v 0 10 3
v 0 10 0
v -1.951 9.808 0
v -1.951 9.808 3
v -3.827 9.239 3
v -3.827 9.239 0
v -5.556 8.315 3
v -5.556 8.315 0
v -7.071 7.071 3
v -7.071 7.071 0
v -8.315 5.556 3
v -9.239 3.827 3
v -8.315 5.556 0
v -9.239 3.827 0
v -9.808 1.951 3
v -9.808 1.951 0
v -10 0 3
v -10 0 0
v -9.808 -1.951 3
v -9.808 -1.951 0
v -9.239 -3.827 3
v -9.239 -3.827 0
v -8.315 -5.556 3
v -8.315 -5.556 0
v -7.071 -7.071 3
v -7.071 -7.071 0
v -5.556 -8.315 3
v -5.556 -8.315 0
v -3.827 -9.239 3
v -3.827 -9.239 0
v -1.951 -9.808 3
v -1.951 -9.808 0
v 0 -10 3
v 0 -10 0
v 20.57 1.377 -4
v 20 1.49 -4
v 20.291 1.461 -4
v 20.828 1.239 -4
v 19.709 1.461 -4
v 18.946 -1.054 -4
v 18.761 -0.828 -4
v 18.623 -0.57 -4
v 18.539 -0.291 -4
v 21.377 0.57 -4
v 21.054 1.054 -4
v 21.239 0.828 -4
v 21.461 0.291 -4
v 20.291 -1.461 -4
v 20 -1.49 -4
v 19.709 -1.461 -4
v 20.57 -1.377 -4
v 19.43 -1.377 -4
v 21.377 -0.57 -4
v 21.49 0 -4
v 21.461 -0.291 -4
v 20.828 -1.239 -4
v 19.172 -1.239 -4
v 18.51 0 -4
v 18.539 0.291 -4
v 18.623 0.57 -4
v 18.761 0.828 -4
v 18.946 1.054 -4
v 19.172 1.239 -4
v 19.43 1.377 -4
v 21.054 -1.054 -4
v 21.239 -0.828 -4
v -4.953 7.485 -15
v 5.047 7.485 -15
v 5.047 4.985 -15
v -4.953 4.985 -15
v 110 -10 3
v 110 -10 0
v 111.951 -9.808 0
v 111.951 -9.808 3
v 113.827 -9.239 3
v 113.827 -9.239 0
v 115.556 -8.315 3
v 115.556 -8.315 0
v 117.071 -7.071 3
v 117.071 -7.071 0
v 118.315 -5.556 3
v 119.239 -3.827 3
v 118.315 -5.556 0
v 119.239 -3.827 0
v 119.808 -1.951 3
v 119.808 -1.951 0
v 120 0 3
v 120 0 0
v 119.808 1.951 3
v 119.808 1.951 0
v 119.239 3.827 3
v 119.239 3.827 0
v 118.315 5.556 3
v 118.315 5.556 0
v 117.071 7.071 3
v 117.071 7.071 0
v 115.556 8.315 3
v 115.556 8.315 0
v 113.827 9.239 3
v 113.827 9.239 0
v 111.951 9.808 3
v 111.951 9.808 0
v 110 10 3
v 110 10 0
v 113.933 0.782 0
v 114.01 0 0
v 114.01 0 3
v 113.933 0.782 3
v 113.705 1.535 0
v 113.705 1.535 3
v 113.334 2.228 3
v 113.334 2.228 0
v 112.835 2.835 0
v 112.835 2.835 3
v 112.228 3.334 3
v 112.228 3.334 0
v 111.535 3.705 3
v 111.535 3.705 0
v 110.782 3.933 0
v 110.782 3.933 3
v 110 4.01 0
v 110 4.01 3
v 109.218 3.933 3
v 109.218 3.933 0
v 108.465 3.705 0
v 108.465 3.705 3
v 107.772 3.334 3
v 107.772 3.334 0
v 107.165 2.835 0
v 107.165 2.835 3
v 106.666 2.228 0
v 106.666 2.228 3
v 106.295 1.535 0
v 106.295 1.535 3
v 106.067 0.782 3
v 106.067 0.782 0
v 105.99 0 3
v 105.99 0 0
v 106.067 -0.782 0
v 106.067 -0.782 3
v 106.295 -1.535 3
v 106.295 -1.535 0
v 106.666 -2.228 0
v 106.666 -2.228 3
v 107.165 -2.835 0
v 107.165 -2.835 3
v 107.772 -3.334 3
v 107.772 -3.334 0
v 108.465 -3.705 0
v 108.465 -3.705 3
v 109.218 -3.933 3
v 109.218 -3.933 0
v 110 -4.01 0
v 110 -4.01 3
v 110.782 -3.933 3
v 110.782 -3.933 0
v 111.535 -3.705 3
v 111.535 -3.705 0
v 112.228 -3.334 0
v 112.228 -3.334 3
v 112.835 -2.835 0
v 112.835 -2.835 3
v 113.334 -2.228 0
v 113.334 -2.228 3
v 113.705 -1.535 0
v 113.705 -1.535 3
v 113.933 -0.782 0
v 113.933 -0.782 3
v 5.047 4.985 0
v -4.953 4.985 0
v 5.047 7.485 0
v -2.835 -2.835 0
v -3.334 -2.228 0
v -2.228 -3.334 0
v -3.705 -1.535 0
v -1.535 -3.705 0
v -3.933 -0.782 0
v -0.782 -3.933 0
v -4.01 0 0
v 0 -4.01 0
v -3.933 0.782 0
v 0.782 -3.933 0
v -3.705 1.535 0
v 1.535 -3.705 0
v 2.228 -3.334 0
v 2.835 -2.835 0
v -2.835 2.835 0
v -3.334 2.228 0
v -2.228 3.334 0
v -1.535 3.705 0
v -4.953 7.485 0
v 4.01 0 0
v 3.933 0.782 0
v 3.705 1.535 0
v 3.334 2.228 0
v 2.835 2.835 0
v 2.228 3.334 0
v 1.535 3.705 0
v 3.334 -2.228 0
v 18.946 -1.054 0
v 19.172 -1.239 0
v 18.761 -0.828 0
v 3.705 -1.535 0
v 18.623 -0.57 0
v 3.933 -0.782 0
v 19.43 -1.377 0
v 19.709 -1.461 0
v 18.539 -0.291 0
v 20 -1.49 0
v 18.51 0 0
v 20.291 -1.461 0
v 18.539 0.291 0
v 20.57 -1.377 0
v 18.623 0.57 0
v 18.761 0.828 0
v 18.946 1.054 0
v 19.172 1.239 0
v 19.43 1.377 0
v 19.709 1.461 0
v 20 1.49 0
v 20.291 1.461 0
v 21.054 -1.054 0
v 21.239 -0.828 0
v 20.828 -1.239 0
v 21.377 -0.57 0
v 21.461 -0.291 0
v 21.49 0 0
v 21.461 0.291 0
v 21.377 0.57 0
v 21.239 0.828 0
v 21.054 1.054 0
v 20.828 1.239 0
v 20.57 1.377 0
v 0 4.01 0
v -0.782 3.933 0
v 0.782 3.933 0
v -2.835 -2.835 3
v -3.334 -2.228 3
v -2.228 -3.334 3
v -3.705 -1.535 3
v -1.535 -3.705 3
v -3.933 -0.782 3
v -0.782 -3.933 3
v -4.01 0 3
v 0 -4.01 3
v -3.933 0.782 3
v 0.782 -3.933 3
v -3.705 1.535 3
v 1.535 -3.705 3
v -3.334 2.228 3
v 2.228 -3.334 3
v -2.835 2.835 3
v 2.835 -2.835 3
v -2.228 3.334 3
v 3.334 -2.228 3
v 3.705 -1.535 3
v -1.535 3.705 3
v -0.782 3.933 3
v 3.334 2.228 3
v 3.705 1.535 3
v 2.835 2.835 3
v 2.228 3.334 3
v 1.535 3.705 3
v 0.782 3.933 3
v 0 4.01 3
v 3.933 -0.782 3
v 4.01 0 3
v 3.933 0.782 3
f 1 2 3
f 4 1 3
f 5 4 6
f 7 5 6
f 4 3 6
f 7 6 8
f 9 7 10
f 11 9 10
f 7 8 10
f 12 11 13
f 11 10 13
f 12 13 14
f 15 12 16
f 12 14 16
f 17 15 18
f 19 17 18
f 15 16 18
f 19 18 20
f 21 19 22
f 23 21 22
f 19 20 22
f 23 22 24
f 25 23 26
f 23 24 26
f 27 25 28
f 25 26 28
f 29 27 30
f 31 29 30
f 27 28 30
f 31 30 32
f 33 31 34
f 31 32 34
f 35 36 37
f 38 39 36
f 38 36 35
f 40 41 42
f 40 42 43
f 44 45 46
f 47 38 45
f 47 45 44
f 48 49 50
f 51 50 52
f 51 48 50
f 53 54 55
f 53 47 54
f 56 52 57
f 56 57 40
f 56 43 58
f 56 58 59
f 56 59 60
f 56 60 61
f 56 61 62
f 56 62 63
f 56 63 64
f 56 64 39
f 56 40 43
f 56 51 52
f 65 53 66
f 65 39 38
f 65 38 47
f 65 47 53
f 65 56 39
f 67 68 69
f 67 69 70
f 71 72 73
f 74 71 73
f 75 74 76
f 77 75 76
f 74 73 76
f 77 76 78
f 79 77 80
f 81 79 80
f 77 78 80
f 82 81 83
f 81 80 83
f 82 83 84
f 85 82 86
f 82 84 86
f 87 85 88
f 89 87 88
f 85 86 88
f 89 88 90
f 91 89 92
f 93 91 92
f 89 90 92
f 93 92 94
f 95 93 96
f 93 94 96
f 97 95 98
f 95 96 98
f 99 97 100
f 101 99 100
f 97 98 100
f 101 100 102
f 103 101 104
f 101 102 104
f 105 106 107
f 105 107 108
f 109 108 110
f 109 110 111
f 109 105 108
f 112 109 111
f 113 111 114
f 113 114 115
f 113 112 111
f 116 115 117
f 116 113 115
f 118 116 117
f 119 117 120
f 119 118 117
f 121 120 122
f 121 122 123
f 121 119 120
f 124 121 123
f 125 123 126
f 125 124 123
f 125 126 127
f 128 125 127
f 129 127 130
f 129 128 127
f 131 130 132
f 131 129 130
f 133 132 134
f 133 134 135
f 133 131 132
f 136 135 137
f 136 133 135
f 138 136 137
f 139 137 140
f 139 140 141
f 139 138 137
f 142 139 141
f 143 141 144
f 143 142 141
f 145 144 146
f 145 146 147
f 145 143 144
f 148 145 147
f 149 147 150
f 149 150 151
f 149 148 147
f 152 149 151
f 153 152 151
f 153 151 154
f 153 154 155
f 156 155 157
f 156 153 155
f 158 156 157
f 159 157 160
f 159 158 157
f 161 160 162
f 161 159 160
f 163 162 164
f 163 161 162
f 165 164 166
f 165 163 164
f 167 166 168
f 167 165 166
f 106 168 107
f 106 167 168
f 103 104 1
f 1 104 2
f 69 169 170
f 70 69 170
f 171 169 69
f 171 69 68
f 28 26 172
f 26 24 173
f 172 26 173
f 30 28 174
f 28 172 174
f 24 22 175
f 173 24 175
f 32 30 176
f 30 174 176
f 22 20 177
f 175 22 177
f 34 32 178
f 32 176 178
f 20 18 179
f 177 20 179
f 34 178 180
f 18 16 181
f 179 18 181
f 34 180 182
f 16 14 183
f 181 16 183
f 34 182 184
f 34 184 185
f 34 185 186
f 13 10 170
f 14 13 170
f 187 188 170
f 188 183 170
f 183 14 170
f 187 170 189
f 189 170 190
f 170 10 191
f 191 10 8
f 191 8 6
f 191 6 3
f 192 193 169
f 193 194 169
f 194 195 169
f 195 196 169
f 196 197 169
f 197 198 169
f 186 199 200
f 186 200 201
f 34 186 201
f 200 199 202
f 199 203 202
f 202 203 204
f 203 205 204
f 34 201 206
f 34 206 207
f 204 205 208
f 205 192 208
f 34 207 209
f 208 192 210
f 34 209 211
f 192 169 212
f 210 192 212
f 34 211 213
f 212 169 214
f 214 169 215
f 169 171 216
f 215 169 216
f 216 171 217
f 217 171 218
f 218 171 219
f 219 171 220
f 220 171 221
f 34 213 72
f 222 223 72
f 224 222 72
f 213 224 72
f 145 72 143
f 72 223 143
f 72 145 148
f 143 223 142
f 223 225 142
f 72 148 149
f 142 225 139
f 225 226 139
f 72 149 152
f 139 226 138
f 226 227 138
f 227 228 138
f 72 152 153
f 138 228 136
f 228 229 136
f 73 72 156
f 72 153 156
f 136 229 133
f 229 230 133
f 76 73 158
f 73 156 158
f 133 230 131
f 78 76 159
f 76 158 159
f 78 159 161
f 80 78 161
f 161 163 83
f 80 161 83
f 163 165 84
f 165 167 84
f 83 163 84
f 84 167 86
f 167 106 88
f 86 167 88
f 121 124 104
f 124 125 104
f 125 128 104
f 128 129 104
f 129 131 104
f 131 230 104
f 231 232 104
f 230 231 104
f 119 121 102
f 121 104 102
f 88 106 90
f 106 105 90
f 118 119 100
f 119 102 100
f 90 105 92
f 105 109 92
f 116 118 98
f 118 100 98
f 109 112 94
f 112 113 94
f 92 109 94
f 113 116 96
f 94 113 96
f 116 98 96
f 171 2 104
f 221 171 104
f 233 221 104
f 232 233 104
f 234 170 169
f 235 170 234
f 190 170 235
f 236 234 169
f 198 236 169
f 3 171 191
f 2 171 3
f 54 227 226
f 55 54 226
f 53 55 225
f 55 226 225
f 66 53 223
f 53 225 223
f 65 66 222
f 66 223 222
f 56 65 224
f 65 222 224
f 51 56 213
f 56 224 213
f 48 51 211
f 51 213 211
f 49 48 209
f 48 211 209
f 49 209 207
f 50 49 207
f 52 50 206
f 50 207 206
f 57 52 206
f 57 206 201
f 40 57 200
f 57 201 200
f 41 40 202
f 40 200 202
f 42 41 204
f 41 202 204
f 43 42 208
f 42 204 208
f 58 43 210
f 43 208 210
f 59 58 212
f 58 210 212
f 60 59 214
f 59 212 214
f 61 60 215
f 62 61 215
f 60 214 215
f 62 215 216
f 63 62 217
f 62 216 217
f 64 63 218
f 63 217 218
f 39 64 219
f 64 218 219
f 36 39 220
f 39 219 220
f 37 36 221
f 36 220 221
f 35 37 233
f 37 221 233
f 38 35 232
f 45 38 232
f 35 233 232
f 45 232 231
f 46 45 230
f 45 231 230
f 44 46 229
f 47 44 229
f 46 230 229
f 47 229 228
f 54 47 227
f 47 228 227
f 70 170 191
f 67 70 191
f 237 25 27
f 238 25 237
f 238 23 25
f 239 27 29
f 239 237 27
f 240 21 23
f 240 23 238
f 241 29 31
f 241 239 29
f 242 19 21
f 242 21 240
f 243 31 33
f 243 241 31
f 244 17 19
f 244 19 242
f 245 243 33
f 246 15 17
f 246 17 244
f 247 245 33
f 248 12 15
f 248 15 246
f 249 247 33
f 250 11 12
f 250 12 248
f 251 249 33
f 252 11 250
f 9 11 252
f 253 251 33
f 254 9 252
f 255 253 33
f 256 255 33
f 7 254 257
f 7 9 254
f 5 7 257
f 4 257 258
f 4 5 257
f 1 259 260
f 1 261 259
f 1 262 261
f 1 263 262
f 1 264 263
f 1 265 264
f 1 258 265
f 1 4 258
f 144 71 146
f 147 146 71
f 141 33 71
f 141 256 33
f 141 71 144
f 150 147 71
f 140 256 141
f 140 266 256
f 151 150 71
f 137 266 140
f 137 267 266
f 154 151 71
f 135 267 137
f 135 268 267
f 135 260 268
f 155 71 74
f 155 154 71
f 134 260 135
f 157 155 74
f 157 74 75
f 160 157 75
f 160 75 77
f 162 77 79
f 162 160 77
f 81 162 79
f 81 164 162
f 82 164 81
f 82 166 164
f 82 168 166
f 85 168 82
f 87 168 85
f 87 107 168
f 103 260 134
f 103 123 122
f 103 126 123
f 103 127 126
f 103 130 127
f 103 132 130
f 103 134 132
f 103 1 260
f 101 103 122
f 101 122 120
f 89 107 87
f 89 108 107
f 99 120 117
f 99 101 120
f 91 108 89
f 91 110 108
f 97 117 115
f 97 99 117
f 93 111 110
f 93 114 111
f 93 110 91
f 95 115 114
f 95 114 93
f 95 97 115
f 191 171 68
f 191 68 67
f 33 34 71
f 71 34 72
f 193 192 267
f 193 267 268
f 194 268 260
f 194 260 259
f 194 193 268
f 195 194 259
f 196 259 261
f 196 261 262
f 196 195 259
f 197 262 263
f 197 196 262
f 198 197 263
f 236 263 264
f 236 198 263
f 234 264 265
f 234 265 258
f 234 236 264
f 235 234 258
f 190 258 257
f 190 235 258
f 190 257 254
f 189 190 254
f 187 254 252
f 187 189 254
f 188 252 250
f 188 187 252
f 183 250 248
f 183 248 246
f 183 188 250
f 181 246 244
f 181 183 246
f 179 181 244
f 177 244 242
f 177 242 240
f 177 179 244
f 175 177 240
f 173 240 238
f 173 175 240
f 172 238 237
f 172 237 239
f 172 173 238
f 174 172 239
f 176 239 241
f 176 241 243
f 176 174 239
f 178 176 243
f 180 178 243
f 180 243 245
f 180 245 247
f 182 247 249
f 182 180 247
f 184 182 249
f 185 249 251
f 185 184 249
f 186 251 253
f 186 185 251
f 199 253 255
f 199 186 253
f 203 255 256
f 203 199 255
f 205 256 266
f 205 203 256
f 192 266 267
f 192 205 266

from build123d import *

# Parameters (mm, degrees)
SKETCH1_R           = 4.01
BOSS_EXTRUDE1_DEPTH = 3
SKETCH2_R           = 1.49
BOSS_EXTRUDE3_DEPTH = 4
SKETCH4_W           = 10
SKETCH4_H           = 2.5
BOSS_EXTRUDE5_DEPTH = 15


with BuildPart() as part:
    # Sketch1 → Boss-Extrude1 (new body)
    with BuildSketch(Plane.XY):
        with BuildLine():
            Line((110, 10), (0, 10))
            ThreePointArc((0, 10), (-10, 0), (0, -10))
            Line((0, -10), (110, -10))
            ThreePointArc((110, -10), (120, 0), (110, 10))
        make_face()
        Circle(SKETCH1_R, mode=Mode.SUBTRACT)
        with Locations((110, 0)):
            Circle(SKETCH1_R, mode=Mode.SUBTRACT)
    extrude(amount=BOSS_EXTRUDE1_DEPTH)

    # Sketch2 → Boss-Extrude3 (add)
    with BuildSketch(Plane(origin=(0, 0, 0), x_dir=(-1, 0, 0), z_dir=(0, 0, -1))):
        with Locations(Location((-20, 0, 0), (0, 0, 180))):
            Circle(SKETCH2_R)
    extrude(amount=BOSS_EXTRUDE3_DEPTH)

    # Sketch4 → Boss-Extrude5 (add)
    with BuildSketch(Plane(origin=(0, 0, 0), x_dir=(-1, 0, 0), z_dir=(0, 0, -1))):
        with Locations((-0.046889456, 6.235161972)):
            Rectangle(SKETCH4_W, SKETCH4_H)
    extrude(amount=BOSS_EXTRUDE5_DEPTH)


solid = part.part
